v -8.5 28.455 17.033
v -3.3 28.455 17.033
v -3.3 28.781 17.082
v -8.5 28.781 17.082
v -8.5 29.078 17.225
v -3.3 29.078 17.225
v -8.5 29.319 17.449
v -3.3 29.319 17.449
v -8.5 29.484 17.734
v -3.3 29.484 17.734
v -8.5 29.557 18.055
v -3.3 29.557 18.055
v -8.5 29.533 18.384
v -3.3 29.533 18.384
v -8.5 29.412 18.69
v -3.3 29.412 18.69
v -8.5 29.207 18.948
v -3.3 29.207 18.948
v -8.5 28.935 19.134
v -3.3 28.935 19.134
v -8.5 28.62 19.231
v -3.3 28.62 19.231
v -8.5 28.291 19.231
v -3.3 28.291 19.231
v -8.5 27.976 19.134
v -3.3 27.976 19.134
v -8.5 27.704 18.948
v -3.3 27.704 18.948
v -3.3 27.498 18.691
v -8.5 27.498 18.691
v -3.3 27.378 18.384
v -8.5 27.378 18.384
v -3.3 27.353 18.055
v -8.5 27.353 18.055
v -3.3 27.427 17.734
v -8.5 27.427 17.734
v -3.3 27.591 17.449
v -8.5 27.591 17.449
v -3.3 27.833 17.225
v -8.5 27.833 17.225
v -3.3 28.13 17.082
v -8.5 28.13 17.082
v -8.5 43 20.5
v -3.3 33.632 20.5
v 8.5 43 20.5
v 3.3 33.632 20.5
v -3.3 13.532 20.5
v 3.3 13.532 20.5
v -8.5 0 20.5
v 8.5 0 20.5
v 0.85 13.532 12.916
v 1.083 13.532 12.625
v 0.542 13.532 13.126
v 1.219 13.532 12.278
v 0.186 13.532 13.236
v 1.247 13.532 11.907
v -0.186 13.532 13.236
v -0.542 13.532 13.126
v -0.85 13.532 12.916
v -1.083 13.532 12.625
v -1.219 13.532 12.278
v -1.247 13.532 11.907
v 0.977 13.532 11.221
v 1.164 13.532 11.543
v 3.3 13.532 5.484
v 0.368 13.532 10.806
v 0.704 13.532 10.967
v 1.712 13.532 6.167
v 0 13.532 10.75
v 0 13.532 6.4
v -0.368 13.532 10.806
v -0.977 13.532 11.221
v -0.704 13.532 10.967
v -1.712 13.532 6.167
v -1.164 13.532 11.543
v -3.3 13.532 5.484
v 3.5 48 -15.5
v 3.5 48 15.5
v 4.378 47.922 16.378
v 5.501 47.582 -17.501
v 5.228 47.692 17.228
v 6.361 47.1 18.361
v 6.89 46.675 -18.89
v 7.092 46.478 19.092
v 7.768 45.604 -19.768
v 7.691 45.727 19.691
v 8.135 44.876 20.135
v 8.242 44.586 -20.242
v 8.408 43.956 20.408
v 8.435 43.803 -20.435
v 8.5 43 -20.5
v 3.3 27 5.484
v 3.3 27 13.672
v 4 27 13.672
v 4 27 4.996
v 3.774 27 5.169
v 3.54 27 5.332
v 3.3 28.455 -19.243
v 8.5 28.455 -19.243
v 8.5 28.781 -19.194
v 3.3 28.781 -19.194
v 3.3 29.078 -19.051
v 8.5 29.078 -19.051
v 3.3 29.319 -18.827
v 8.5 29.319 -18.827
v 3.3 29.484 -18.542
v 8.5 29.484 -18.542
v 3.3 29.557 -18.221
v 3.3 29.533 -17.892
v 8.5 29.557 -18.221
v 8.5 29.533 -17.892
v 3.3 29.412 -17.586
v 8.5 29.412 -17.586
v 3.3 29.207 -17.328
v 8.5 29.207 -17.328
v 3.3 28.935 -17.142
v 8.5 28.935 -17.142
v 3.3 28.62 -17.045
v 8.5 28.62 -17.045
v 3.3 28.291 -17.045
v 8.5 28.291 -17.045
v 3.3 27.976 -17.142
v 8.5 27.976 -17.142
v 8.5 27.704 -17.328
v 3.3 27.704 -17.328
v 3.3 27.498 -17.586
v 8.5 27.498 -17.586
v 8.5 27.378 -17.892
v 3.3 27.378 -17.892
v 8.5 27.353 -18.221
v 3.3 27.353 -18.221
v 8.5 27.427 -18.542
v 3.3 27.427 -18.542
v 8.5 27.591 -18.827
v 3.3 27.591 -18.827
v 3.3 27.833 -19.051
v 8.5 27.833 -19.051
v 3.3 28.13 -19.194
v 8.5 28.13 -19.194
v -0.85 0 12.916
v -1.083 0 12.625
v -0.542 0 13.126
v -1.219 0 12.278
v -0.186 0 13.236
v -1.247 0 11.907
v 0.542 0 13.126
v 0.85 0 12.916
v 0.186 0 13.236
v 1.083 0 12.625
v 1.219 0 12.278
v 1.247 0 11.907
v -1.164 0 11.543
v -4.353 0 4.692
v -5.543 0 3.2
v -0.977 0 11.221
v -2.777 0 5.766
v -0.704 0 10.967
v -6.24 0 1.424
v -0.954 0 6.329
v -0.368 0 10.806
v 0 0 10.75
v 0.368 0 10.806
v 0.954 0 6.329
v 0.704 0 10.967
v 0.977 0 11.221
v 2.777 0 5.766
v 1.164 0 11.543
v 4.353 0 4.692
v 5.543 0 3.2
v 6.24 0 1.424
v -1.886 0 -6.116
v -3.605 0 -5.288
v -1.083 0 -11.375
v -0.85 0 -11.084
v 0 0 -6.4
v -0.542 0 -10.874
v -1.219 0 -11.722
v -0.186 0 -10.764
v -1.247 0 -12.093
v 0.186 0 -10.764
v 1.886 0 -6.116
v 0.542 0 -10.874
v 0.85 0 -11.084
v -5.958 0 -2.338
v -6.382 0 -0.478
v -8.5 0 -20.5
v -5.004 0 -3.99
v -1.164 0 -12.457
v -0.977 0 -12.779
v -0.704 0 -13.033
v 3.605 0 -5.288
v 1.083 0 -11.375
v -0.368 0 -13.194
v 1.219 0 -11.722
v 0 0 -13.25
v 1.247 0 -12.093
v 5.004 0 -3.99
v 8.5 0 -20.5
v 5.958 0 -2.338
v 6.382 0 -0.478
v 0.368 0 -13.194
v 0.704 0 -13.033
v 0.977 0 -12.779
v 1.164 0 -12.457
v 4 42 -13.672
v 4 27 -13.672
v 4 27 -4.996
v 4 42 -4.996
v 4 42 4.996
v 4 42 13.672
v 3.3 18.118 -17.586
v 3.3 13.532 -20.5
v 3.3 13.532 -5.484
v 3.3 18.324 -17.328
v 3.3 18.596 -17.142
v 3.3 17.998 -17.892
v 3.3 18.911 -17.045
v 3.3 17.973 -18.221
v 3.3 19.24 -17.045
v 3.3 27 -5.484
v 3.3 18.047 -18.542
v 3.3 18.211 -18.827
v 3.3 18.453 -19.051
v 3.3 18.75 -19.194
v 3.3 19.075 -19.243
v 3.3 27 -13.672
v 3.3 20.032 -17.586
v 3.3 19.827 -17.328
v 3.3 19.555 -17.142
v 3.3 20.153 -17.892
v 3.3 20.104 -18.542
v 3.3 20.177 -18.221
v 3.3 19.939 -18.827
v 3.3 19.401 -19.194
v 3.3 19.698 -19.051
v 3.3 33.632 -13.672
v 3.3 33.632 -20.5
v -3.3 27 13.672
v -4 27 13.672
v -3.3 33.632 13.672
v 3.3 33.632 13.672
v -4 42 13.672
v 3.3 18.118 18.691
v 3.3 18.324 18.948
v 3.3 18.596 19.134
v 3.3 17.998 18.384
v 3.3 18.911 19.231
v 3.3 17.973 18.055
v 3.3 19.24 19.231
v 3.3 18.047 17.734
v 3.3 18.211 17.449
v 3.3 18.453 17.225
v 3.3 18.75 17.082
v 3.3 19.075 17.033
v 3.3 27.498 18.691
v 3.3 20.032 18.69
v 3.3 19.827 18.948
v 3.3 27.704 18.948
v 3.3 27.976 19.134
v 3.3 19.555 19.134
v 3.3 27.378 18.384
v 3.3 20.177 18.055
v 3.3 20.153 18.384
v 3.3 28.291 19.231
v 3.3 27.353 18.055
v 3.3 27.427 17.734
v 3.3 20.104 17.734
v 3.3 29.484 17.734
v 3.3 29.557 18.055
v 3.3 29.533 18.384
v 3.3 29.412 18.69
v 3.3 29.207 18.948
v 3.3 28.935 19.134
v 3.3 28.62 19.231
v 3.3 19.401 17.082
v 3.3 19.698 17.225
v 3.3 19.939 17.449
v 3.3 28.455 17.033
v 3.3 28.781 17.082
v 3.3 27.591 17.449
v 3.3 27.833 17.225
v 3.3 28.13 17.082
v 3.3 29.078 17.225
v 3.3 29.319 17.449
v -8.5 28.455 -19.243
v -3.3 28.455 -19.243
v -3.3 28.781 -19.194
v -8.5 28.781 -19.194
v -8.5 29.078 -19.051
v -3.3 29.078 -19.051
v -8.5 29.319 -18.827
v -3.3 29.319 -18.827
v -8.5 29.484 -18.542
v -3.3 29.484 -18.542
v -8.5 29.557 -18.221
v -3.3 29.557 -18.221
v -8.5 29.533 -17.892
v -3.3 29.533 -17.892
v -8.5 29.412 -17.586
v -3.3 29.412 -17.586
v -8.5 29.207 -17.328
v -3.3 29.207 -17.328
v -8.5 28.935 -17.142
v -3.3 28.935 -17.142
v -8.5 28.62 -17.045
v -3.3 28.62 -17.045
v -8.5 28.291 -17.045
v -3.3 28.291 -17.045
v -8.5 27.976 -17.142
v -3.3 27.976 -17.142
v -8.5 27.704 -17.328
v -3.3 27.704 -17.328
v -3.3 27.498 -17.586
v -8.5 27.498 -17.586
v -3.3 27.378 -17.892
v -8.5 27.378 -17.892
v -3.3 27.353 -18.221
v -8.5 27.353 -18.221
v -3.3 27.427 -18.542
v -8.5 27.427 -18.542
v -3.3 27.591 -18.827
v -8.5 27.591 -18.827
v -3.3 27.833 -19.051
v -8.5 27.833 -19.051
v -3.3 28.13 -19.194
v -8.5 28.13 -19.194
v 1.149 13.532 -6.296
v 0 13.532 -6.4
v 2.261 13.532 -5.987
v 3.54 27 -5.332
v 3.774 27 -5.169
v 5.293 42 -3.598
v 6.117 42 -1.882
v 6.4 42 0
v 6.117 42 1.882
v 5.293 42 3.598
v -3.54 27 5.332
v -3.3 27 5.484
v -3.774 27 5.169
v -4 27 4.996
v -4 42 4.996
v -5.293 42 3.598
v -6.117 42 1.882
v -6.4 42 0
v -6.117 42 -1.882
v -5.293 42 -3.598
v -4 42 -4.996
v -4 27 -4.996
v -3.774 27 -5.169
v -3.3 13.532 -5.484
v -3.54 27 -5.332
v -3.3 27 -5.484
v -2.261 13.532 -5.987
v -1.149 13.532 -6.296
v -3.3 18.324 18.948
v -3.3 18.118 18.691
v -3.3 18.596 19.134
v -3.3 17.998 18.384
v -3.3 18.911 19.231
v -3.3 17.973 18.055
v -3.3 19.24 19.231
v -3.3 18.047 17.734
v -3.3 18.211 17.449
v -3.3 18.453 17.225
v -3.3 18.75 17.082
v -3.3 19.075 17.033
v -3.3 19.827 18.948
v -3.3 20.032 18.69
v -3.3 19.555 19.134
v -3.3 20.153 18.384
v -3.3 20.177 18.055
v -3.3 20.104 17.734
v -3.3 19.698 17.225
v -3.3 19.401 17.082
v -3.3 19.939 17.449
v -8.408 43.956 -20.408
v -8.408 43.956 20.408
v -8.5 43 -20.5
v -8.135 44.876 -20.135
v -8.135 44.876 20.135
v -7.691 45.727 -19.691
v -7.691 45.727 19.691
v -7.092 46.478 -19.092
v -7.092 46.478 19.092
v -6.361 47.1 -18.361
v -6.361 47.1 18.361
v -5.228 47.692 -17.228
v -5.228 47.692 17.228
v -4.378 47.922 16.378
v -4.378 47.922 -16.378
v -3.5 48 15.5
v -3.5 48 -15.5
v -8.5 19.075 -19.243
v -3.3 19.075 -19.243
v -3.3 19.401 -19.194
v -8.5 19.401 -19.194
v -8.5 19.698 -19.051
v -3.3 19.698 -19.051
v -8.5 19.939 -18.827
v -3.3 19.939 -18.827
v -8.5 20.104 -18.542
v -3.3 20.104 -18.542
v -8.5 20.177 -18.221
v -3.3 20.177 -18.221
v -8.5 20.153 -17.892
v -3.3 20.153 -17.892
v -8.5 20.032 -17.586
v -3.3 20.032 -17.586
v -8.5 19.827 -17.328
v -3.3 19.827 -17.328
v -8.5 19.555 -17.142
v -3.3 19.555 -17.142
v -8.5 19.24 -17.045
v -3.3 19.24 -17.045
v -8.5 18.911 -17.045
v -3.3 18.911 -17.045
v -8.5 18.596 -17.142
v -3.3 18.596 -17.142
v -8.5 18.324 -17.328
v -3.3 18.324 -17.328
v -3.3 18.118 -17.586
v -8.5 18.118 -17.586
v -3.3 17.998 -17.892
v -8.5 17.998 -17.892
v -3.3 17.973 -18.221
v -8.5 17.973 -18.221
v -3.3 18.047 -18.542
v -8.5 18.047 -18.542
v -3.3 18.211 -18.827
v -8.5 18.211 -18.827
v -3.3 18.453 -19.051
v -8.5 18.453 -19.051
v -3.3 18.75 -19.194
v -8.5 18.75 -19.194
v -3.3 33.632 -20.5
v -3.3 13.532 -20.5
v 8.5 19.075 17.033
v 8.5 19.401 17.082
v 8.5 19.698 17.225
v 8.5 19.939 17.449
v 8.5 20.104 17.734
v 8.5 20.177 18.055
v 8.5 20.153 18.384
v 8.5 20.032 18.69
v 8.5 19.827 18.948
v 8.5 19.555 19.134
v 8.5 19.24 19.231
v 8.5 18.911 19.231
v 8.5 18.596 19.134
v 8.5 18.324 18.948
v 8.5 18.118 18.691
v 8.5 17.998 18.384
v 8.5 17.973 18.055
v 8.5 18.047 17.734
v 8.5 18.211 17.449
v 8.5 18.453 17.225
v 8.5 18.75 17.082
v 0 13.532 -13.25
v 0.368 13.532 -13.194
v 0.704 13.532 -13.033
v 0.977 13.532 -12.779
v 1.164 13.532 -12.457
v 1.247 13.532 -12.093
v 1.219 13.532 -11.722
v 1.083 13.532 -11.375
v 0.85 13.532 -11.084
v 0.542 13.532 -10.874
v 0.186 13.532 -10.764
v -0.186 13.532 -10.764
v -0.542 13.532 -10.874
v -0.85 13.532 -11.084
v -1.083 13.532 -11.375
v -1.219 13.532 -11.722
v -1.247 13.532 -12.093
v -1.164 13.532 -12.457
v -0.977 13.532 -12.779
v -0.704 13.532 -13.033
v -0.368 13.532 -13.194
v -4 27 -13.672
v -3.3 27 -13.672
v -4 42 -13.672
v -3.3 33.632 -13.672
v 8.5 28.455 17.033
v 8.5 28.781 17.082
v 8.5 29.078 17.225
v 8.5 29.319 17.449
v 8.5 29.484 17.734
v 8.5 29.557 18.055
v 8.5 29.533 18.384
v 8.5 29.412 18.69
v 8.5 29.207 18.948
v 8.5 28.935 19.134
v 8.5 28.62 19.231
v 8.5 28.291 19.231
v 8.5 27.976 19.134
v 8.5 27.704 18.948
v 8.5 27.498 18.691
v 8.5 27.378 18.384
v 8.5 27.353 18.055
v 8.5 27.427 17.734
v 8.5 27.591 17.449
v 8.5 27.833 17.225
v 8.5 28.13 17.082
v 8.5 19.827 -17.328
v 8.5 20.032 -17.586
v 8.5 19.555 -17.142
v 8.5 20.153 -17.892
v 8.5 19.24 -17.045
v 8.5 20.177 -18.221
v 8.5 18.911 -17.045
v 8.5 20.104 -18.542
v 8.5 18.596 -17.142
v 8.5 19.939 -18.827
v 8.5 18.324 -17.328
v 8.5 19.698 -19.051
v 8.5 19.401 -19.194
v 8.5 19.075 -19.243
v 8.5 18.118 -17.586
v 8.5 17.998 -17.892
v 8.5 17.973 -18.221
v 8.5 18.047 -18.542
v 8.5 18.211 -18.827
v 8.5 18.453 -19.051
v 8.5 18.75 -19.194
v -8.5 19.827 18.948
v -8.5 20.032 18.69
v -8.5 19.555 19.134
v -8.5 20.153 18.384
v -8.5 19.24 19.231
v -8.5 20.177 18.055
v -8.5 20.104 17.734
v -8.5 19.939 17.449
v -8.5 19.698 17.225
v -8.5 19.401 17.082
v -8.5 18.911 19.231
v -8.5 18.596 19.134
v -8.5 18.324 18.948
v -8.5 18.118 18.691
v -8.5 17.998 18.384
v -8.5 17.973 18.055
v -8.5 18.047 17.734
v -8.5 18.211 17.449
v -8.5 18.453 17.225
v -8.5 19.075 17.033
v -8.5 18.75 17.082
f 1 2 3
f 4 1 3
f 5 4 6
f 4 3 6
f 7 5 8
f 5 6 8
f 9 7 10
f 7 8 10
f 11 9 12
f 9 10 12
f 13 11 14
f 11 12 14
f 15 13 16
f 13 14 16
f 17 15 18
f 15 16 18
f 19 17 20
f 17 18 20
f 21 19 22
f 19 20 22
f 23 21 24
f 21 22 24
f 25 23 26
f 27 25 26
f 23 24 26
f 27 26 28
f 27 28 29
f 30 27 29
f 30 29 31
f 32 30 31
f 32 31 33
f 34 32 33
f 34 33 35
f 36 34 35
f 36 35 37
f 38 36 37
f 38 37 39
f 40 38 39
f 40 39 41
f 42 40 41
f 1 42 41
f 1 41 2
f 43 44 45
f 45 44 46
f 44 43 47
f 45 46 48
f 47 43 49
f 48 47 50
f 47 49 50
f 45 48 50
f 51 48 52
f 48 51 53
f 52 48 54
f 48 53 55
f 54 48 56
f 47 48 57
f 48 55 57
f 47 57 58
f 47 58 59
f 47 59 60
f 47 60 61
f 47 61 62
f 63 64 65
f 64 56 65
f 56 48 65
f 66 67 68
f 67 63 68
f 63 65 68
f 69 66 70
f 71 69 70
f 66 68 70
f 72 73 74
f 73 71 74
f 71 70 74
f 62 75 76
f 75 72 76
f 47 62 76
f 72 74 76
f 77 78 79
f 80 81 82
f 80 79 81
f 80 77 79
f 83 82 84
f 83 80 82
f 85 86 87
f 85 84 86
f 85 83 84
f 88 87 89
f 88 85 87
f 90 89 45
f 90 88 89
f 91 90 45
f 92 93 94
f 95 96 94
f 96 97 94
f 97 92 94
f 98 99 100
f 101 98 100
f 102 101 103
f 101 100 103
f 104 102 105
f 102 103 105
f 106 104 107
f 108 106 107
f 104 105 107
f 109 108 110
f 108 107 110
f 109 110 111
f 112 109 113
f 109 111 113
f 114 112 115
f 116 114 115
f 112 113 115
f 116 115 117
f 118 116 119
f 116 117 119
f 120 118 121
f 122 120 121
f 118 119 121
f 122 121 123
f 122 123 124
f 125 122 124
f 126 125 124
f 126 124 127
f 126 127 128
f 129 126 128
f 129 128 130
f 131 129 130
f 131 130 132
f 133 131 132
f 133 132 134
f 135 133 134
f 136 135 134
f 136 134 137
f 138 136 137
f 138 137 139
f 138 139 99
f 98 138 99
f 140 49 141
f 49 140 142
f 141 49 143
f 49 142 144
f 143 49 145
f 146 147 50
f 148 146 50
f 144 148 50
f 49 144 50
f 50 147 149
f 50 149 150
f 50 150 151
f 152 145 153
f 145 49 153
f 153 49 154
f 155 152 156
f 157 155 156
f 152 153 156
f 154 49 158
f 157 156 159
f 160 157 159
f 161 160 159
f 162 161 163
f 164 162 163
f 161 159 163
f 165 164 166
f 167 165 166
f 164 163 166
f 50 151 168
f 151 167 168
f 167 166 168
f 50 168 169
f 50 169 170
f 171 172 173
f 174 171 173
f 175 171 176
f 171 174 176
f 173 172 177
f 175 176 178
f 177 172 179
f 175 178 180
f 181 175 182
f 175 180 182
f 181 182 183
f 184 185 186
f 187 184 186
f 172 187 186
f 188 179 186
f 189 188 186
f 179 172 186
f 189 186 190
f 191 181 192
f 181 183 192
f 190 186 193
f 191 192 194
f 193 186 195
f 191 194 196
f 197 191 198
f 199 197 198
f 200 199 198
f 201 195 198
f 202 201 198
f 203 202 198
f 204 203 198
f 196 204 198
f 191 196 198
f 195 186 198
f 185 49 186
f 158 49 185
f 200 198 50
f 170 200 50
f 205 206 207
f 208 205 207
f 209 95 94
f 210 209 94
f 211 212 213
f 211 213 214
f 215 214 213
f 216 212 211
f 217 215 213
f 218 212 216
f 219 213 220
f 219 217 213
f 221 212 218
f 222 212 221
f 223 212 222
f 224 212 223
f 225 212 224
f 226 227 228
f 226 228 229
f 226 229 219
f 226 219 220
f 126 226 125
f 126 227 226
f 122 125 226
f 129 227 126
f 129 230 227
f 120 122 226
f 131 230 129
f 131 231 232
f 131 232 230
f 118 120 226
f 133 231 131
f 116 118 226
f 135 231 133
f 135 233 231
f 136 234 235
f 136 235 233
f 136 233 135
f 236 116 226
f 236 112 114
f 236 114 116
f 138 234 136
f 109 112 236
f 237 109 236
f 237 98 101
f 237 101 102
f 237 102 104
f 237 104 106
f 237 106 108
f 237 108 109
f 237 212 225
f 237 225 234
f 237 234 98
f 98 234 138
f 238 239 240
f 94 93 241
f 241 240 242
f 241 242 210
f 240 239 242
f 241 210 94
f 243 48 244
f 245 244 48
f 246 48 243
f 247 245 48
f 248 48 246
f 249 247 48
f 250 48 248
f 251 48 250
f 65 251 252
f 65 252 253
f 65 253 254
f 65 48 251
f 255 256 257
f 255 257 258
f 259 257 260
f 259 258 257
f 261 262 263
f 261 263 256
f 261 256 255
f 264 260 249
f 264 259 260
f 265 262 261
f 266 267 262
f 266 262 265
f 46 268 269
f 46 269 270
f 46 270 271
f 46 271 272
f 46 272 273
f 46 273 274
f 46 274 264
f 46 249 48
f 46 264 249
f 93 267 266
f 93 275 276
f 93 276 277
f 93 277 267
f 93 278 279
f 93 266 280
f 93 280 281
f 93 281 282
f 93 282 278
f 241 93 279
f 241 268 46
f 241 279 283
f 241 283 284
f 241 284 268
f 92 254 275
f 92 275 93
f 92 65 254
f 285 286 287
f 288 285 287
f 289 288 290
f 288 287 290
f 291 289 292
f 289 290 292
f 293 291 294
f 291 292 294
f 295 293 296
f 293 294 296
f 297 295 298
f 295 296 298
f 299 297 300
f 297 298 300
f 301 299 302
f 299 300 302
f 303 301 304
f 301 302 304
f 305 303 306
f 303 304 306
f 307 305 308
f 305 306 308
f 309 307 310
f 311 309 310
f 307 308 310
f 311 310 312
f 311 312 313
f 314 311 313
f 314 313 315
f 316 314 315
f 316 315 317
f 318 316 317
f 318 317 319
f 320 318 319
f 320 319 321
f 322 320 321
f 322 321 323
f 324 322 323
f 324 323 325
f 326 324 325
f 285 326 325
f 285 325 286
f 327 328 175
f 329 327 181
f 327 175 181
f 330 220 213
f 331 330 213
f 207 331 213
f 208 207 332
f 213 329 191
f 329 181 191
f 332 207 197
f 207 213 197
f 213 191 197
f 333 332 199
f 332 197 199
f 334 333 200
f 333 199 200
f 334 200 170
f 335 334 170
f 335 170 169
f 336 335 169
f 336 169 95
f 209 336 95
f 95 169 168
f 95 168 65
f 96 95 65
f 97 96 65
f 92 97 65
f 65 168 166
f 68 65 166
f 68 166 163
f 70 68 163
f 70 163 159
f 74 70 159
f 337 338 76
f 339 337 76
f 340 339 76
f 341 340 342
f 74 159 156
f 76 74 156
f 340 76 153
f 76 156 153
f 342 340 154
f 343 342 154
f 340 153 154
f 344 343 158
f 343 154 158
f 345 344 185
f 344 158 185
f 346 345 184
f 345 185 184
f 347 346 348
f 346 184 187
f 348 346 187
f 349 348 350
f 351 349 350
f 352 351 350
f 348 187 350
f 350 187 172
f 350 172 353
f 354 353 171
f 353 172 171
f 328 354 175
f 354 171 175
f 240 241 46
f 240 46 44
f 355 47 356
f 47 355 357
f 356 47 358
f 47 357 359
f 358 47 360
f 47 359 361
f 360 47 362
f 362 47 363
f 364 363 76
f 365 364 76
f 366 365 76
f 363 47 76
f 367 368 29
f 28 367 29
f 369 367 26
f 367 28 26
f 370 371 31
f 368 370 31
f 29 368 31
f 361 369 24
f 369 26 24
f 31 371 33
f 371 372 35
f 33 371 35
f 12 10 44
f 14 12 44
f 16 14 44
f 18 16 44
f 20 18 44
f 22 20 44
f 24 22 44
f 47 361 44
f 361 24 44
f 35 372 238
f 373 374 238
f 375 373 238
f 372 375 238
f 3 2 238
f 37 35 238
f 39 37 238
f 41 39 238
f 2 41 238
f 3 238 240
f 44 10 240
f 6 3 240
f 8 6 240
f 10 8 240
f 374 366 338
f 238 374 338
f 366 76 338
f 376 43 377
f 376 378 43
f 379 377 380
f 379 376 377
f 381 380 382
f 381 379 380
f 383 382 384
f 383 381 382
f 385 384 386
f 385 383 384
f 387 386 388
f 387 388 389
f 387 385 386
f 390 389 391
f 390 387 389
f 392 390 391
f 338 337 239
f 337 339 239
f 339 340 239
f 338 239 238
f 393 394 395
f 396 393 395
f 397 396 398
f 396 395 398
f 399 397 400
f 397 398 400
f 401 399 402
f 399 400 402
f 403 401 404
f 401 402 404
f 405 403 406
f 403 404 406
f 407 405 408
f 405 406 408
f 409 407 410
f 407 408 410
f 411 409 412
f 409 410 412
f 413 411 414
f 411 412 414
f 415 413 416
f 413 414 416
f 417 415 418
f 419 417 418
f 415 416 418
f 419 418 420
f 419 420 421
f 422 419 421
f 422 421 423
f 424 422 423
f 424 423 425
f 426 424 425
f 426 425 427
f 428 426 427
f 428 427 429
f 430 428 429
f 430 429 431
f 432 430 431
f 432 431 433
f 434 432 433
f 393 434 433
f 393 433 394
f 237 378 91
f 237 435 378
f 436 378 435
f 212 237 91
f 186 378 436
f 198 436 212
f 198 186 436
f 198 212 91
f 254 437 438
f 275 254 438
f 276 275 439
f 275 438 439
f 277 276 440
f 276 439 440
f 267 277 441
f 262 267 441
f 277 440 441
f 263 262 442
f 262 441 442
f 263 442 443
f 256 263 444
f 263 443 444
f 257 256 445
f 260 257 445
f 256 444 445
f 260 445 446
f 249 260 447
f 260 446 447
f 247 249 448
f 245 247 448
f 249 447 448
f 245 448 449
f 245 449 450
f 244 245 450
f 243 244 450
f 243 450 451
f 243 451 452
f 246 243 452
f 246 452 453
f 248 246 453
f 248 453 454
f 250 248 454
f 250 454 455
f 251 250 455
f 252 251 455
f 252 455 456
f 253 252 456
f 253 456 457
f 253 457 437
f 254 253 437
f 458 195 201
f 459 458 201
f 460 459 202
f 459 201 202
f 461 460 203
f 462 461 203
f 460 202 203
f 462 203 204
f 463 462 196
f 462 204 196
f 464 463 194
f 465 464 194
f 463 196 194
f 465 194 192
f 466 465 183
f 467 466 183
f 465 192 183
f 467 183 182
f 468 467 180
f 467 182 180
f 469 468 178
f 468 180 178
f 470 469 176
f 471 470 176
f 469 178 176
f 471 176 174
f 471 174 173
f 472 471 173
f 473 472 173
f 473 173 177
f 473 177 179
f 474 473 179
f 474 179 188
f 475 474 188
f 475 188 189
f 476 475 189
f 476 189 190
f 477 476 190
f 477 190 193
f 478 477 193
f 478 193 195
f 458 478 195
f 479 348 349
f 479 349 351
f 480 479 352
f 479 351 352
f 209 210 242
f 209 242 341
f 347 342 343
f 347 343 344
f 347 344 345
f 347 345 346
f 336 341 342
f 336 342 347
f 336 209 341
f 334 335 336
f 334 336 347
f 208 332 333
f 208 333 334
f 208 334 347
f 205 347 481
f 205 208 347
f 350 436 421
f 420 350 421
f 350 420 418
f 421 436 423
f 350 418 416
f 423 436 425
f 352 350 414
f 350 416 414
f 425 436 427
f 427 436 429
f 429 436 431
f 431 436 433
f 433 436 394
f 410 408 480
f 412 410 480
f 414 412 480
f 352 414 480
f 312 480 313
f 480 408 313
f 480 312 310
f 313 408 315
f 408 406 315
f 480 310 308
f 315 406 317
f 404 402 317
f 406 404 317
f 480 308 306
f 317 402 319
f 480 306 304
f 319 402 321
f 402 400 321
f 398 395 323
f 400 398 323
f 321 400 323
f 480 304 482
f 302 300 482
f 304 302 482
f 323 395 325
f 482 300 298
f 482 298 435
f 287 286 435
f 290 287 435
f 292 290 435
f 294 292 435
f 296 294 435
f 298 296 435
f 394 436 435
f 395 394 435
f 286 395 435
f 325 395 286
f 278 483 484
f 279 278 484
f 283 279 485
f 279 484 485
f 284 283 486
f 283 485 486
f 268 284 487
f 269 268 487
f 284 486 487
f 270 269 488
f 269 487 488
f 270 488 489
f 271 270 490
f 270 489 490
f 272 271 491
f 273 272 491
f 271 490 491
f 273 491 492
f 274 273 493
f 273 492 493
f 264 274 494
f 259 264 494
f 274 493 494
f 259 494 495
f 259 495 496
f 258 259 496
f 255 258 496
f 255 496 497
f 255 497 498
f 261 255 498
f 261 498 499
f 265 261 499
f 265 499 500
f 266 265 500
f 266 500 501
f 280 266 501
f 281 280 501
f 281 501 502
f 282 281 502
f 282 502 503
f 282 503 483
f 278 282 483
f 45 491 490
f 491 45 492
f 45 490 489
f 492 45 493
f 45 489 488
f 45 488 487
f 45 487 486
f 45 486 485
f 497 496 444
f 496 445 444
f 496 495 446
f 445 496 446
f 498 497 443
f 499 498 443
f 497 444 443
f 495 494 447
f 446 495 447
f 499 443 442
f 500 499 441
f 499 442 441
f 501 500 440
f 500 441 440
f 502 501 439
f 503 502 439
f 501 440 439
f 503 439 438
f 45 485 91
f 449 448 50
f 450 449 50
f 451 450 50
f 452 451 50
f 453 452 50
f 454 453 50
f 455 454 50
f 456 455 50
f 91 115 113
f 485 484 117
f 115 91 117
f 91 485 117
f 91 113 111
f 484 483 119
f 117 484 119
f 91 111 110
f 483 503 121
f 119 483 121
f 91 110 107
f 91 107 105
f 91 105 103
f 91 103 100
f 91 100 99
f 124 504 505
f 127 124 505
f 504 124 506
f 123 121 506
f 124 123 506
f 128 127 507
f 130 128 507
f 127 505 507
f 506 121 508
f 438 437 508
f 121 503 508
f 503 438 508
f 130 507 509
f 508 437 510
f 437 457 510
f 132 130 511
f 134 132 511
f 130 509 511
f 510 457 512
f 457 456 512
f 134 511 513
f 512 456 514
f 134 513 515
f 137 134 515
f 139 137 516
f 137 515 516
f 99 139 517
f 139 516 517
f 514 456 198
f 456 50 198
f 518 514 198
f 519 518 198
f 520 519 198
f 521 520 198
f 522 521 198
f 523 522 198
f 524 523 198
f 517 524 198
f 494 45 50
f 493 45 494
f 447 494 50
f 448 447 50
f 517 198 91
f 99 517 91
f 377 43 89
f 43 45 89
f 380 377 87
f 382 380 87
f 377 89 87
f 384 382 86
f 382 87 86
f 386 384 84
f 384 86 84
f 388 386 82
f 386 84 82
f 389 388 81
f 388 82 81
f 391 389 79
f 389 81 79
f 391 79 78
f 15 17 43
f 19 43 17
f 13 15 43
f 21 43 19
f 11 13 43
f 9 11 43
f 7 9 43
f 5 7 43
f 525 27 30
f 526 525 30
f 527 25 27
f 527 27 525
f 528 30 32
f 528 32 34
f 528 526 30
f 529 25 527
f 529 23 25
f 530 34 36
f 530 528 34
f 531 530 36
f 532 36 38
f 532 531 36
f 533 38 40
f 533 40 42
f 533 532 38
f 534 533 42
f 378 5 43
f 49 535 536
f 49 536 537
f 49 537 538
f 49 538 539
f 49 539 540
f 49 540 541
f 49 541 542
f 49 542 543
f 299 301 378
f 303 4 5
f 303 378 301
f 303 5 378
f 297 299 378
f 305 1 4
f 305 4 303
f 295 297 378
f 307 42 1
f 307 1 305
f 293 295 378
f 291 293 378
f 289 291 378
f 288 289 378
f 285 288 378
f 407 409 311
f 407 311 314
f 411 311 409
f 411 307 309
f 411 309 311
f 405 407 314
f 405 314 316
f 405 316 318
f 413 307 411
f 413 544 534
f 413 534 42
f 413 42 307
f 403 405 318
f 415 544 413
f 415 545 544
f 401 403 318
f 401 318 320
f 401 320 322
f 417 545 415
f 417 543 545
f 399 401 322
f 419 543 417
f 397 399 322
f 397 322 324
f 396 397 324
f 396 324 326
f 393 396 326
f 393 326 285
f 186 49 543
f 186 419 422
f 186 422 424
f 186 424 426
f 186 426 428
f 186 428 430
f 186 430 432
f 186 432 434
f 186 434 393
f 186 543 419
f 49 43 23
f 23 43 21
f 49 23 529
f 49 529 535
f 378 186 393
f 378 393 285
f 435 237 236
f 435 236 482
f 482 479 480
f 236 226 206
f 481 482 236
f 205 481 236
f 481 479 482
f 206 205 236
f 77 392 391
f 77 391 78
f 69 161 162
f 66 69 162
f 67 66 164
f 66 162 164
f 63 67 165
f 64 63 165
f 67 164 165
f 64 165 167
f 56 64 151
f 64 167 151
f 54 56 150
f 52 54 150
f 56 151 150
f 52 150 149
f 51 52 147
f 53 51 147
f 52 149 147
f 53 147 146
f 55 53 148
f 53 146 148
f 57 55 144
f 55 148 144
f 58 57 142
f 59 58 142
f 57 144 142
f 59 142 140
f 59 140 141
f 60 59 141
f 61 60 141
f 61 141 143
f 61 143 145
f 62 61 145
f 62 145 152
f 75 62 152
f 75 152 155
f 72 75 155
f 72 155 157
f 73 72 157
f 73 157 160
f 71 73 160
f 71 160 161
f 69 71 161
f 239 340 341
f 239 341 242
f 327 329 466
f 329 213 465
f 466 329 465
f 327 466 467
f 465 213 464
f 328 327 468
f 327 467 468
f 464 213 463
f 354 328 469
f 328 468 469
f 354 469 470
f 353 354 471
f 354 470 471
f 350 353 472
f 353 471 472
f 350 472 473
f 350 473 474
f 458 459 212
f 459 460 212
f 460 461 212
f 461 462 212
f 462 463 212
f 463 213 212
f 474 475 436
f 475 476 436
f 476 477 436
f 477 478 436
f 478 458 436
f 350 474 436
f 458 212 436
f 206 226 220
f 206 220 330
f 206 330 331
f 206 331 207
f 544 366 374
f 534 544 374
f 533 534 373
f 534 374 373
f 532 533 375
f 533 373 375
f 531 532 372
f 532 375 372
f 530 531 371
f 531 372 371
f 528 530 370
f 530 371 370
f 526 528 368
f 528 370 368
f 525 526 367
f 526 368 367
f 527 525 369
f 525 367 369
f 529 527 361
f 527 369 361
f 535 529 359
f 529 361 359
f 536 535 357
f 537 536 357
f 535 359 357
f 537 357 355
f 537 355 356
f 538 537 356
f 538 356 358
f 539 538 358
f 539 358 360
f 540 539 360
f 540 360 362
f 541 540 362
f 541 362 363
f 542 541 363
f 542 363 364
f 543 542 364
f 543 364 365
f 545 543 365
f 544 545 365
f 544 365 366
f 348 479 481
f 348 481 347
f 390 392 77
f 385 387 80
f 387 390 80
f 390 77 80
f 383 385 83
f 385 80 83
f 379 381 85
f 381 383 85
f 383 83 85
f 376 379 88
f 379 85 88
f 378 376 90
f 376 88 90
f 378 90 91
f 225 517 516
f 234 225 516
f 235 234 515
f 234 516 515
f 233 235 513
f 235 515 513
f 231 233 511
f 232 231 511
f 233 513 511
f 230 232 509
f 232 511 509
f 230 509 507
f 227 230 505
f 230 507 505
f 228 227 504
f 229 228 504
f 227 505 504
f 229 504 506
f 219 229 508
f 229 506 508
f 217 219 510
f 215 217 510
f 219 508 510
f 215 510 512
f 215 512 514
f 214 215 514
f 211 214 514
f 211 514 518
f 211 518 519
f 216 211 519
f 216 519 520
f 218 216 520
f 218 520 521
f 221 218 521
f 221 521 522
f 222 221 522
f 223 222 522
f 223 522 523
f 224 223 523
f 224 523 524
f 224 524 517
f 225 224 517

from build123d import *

# Parameters (mm, degrees)
SKETCH1_W                    = 17
SKETCH1_H                    = 41
BOSS_EXTRUDE1_DEPTH          = 48
SKETCH2_W                    = 6.6
SKETCH2_H                    = 20.1
CUT_EXTRUDE1_DEPTH           = 64.696546217
SKETCH3_R                    = 1.105
CUT_EXTRUDE2_DEPTH           = 55.893077888
SKETCH4_R                    = 6.4
CUT_EXTRUDE3_DEPTH           = 42
FILLET3_R                    = 5
SKETCH8_W                    = 8
SKETCH8_H                    = 27.344585772
CUT_EXTRUDE4_DEPTH           = 15
TAP_DRILL_FOR_M3_TAP1_REACH  = 60.588
TAP_DRILL_FOR_M3_TAP1_BORE_R = 1.25


with BuildPart() as part:
    # Sketch1 → Boss-Extrude1 (new body)
    with BuildSketch(Plane(origin=(0, 0, 0), x_dir=(1, 0, 0), z_dir=(0, 1, 0))):
        Rectangle(SKETCH1_W, SKETCH1_H)
    extrude(amount=BOSS_EXTRUDE1_DEPTH)

    # Sketch2 → Cut-Extrude1 (cut, through all)
    with BuildSketch(Plane(origin=(0, 0, -20.5), x_dir=(-1, 0, 0), z_dir=(0, 0, -1))):
        with Locations((0, 23.582414356)):
            Rectangle(SKETCH2_W, SKETCH2_H)
    extrude(amount=-CUT_EXTRUDE1_DEPTH, mode=Mode.SUBTRACT)

    # Sketch3 → Cut-Extrude2 (cut, through all)
    with BuildSketch(Plane(origin=(8.5, 0, 0), x_dir=(0, 0, -1), z_dir=(1, 0, 0))):
        with Locations((-18.138, 19.075341505)):
            Circle(SKETCH3_R)
        with Locations((-18.138, 28.455341505)):
            Circle(SKETCH3_R)
        with Locations((18.138, 28.455341505)):
            Circle(SKETCH3_R)
        with Locations((18.138, 19.075341505)):
            Circle(SKETCH3_R)
    extrude(amount=-CUT_EXTRUDE2_DEPTH, mode=Mode.SUBTRACT)

    # Sketch4 → Cut-Extrude3 (cut)
    with BuildSketch(Plane.XZ):
        with Locations(Location((0, 0, 0), (0, 0, 270))):
            Circle(SKETCH4_R)
    extrude(amount=-CUT_EXTRUDE3_DEPTH, mode=Mode.SUBTRACT)

    # Fillet3
    fillet3_edges = [part.edges().sort_by_distance(p)[0] for p in [
        (-8.5, 48, 0),
        (0, 48, 20.5),
        (8.5, 48, 0),
        (0, 48, -20.5),
    ]]
    fillet(fillet3_edges, radius=FILLET3_R)

    # Sketch8 → Cut-Extrude4 (cut)
    with BuildSketch(Plane.XZ.offset(-42)):
        Rectangle(SKETCH8_W, SKETCH8_H)
    extrude(amount=CUT_EXTRUDE4_DEPTH, mode=Mode.SUBTRACT)

    # Tap Drill for M3 Tap1 bore (on position points) → Tap Drill for M3 Tap1 (cut, up to next)
    with BuildSketch(Plane(origin=(0, 0, -12), x_dir=(0, 0, -1), z_dir=(0, -1, 0)), mode=Mode.PRIVATE) as tap_drill_for_m3_tap1_sk1:
        Circle(TAP_DRILL_FOR_M3_TAP1_BORE_R)
    tap_drill_for_m3_tap1_tool1 = extrude(tap_drill_for_m3_tap1_sk1.sketch, amount=-TAP_DRILL_FOR_M3_TAP1_REACH, mode=Mode.PRIVATE) & part.part
    # Tap Drill for M3 Tap1 bore (on position points) → Tap Drill for M3 Tap1 (cut, up to next)
    with BuildSketch(Plane(origin=(0, 0, -12), x_dir=(0, 0, -1), z_dir=(0, -1, 0)), mode=Mode.PRIVATE) as tap_drill_for_m3_tap1_sk2:
        with Locations((-24, 0)):
            Circle(TAP_DRILL_FOR_M3_TAP1_BORE_R)
    tap_drill_for_m3_tap1_tool2 = extrude(tap_drill_for_m3_tap1_sk2.sketch, amount=-TAP_DRILL_FOR_M3_TAP1_REACH, mode=Mode.PRIVATE) & part.part
    add(tap_drill_for_m3_tap1_tool1.solids().sort_by_distance((0, 0, -12))[0], mode=Mode.SUBTRACT)
    add(tap_drill_for_m3_tap1_tool2.solids().sort_by_distance((0, 0, 12))[0], mode=Mode.SUBTRACT)


solid = part.part
